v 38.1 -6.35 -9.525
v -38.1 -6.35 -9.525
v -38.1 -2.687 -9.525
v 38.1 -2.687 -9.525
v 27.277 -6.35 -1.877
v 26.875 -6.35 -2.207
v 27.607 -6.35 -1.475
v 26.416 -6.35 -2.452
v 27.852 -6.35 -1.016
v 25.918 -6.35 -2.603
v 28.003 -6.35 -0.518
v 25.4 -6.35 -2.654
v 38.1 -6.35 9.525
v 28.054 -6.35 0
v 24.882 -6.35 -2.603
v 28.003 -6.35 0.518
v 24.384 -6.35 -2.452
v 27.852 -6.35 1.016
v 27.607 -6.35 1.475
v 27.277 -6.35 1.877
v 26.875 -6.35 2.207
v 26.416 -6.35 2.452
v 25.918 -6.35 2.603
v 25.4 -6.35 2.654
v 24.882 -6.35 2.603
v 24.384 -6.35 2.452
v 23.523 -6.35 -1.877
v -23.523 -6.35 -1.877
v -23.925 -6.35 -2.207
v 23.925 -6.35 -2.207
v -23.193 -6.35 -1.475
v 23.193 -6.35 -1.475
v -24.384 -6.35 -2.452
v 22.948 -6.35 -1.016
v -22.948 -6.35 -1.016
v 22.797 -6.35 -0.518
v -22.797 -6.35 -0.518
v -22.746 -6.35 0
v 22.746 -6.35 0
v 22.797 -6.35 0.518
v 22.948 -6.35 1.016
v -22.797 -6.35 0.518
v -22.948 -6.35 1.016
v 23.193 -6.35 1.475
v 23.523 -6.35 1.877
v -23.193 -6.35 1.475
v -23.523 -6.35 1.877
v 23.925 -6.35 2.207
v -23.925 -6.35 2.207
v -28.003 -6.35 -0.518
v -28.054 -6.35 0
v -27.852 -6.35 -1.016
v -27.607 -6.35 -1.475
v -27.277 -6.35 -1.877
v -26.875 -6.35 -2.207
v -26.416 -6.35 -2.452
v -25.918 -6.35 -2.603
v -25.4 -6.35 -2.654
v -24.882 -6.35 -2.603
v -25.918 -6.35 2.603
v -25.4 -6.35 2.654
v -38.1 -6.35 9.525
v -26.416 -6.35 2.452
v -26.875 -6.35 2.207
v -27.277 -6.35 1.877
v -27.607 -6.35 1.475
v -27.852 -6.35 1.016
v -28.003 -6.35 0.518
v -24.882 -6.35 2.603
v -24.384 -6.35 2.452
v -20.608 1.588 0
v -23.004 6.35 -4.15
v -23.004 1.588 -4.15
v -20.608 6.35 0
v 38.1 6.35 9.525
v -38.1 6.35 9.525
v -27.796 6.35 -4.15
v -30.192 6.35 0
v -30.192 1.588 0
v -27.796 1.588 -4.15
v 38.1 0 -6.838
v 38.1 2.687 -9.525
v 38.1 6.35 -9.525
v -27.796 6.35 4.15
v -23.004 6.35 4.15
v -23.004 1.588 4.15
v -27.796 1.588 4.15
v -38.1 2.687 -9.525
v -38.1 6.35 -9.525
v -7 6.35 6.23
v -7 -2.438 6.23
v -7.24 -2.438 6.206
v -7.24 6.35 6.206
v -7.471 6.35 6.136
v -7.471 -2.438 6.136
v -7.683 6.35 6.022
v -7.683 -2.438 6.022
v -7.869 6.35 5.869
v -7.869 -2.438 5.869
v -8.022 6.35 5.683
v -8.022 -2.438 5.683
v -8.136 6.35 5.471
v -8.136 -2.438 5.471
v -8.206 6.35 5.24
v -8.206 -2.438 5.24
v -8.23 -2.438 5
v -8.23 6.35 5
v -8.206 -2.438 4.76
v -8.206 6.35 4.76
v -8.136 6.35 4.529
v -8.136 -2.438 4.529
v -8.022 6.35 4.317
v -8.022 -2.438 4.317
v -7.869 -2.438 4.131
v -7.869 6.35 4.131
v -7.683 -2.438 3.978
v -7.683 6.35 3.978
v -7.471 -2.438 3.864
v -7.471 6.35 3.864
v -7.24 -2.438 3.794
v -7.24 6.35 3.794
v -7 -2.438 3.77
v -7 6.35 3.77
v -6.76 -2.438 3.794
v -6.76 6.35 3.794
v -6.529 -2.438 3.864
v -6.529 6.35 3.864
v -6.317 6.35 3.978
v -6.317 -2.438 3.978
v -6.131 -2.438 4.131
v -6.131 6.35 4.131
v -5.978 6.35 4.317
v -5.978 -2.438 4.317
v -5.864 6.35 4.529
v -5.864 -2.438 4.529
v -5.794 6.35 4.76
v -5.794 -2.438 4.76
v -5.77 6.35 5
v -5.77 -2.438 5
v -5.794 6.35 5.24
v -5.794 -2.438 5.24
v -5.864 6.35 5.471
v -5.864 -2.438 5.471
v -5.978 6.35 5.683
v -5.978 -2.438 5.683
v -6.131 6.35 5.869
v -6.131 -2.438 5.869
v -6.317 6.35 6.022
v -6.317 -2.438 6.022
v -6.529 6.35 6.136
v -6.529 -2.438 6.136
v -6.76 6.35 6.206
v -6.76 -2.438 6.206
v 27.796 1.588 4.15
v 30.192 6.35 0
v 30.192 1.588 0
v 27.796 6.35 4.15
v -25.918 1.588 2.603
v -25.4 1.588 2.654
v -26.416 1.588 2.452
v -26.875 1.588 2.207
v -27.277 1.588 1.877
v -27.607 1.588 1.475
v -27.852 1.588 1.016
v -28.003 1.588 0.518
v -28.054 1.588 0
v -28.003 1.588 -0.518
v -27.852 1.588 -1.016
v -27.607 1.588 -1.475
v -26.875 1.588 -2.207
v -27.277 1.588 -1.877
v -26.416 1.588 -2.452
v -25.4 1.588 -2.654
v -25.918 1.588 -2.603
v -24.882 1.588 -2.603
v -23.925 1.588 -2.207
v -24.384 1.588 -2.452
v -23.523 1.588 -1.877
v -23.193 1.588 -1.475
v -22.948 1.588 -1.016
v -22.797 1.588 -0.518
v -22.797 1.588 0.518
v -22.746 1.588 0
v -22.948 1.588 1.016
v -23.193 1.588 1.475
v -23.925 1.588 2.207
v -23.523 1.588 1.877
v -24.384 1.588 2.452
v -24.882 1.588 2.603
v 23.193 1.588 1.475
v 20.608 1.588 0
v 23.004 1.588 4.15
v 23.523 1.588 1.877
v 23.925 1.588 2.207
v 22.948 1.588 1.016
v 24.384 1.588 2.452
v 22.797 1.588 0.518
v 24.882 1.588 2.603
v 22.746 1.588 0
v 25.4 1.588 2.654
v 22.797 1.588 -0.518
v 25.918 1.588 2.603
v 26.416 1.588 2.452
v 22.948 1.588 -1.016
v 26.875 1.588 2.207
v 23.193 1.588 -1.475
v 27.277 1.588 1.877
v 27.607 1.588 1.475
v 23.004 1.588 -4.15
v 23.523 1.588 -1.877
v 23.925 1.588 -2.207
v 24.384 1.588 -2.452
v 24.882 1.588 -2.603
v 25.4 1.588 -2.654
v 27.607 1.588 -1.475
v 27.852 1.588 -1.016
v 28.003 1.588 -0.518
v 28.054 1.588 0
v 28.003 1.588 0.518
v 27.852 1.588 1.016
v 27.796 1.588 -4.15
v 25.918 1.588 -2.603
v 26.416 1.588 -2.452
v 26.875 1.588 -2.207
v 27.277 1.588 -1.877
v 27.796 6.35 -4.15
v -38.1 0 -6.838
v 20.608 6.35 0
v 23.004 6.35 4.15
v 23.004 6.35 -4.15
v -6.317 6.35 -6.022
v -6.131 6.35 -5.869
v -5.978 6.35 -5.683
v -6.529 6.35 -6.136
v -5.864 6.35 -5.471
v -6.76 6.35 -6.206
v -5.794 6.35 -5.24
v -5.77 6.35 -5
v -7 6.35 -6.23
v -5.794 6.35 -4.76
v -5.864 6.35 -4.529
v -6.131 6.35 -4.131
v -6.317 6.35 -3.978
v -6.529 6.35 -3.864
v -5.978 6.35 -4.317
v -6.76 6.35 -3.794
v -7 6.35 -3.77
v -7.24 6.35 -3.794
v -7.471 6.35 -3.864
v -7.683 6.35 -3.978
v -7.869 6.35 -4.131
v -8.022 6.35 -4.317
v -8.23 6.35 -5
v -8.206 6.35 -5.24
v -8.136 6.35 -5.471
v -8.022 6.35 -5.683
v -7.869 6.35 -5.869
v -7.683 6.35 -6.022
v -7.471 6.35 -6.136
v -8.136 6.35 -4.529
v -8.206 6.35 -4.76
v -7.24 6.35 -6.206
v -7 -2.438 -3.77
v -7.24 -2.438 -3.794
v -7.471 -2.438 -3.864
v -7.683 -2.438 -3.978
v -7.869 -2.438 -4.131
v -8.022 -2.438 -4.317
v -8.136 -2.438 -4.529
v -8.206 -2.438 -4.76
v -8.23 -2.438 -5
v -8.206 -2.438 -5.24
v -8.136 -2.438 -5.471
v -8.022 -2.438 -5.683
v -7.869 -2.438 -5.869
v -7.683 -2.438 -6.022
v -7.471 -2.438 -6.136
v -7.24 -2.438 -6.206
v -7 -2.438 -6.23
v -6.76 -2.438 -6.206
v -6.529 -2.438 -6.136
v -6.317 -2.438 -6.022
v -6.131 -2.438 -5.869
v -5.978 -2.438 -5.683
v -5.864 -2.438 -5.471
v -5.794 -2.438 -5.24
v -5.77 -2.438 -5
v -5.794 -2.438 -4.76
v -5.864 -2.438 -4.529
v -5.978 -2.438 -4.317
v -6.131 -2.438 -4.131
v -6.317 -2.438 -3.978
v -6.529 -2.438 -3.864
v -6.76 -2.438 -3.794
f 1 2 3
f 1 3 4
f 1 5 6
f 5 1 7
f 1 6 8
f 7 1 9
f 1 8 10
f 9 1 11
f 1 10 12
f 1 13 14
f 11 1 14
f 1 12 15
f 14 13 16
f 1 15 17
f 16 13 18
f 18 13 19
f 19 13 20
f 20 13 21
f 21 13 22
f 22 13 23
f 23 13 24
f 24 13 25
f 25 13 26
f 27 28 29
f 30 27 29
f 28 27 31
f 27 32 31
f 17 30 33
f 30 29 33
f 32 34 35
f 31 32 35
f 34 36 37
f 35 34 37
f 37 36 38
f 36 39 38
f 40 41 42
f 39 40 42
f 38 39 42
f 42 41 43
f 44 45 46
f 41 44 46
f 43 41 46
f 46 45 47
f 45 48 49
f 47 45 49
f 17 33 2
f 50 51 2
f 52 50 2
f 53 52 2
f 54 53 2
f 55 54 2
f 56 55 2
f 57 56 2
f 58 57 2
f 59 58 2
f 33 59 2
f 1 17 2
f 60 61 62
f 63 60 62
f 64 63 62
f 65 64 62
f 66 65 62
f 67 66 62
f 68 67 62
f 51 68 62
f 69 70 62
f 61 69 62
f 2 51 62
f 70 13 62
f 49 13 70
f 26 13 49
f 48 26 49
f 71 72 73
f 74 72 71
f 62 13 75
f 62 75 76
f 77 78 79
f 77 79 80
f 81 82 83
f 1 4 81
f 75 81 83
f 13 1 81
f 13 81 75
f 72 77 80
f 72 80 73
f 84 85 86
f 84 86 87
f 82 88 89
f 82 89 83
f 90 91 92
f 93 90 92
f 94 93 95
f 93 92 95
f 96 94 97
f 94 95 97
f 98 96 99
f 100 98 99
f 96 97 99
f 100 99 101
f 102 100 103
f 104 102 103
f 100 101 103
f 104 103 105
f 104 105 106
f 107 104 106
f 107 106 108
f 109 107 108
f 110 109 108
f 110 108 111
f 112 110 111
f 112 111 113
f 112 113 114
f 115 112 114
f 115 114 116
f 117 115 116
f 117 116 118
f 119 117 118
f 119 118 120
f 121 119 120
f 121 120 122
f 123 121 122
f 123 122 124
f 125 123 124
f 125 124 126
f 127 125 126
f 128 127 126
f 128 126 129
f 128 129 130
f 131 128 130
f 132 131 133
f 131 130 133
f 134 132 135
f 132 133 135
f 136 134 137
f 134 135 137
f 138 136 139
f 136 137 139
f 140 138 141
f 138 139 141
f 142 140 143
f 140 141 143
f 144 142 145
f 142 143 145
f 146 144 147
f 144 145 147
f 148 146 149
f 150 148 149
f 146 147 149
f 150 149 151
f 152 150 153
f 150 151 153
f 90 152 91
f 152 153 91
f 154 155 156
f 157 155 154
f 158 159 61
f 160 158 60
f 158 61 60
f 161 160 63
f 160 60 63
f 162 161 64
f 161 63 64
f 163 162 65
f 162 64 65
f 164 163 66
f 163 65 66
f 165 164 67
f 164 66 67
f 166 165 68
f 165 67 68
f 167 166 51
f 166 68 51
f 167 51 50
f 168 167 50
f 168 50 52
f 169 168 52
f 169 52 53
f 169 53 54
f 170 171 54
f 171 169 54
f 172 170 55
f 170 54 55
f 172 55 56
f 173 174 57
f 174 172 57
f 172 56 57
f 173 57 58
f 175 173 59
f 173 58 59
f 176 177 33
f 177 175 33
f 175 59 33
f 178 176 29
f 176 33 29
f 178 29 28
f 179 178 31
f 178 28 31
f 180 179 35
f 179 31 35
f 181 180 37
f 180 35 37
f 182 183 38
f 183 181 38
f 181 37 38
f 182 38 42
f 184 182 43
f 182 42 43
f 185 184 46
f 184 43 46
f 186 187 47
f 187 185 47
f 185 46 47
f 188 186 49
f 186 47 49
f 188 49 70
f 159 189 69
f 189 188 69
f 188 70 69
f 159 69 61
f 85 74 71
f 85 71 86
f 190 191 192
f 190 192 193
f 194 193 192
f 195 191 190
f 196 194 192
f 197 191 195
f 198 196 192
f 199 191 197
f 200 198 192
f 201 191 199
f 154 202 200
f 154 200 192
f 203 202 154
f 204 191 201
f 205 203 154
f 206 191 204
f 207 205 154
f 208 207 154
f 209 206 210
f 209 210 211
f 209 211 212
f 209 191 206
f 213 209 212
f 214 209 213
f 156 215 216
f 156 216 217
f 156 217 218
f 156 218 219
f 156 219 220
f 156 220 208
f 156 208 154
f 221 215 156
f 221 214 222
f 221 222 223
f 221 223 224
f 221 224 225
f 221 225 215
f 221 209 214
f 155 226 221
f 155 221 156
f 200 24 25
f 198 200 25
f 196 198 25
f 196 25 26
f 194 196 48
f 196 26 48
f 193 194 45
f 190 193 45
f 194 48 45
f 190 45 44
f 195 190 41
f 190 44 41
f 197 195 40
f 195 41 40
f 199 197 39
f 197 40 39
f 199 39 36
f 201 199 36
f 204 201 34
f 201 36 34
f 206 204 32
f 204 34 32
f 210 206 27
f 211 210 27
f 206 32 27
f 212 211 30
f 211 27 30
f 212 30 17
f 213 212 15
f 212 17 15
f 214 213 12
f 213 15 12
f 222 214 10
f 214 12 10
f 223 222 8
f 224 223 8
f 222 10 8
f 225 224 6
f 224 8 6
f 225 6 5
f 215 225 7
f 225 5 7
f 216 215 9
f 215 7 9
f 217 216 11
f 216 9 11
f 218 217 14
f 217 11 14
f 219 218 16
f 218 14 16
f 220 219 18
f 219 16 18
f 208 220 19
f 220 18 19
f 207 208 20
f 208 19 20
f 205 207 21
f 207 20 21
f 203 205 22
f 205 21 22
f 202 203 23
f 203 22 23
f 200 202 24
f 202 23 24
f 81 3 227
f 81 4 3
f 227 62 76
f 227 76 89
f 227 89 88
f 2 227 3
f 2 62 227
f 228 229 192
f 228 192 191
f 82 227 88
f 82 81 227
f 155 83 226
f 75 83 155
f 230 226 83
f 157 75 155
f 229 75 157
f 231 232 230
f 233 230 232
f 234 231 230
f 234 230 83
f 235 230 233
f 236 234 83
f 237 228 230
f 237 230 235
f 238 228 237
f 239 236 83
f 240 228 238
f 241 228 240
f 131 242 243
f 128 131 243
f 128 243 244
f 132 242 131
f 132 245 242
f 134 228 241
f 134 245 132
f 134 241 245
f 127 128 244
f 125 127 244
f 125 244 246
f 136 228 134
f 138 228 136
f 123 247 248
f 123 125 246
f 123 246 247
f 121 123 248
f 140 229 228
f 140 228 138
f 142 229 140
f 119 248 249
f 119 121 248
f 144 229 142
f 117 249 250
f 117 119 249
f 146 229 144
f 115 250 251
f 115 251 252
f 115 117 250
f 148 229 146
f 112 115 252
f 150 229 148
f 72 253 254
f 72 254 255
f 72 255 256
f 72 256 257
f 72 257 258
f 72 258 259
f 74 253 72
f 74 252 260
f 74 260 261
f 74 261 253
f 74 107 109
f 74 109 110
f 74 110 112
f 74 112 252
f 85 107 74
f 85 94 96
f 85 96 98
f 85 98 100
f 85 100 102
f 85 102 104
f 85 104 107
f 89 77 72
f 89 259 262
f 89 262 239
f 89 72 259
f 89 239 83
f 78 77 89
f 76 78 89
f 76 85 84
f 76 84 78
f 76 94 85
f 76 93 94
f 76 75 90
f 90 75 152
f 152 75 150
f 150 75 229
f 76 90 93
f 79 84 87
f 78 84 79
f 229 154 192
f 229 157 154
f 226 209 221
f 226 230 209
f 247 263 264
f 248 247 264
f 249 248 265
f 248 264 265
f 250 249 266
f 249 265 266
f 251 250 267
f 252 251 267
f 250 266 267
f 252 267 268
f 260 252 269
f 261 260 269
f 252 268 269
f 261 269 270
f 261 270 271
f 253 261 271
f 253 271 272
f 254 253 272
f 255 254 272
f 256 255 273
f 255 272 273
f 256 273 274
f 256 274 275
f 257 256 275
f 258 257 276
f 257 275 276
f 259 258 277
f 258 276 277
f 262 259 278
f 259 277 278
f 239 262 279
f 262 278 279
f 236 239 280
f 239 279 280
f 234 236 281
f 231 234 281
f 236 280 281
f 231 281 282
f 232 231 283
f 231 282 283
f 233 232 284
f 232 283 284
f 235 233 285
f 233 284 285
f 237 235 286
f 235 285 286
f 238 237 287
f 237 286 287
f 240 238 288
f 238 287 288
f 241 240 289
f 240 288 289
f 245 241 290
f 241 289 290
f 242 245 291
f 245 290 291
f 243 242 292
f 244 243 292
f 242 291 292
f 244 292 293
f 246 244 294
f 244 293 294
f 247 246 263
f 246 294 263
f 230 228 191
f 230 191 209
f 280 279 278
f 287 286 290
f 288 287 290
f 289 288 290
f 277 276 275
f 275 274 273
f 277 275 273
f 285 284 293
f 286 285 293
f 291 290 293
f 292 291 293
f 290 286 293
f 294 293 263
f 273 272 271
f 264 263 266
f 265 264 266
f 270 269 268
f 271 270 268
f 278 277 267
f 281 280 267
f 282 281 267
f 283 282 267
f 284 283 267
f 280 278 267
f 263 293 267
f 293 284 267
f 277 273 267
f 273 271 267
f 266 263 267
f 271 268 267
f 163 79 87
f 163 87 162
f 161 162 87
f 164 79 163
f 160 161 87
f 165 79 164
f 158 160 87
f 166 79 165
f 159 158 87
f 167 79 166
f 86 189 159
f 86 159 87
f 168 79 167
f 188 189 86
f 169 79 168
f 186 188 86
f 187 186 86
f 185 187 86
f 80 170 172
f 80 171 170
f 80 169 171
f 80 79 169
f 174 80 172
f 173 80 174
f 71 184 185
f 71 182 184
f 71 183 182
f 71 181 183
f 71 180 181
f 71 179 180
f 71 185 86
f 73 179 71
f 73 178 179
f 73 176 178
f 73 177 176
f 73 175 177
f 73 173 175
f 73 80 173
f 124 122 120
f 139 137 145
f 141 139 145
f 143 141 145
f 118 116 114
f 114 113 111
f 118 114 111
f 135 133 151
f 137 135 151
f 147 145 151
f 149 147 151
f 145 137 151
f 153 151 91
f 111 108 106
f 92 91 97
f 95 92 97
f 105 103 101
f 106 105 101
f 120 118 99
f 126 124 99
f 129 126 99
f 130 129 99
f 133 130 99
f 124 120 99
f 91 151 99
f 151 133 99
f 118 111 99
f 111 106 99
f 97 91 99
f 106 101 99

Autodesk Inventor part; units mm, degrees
ref_plane "YZ Plane" through (0, 0, 0) normal (1, 0, 0) x (0, 1, 0)
ref_plane "XZ Plane" through (0, 0, 0) normal (0, 1, 0) x (-1, 0, 0)
ref_plane "XY Plane" through (0, 0, 0) normal (0, 0, 1) x (1, 0, 0)
sketch "Sketch1" plane through (0, 0, 0) normal (0, 1, 0) x (-1, 0, 0)
  line L0 (-38.1, 9.525) -> (38.1, 9.525)
  line L1 (38.1, 9.525) -> (38.1, -9.525)
  line L2 (38.1, -9.525) -> (-38.1, -9.525)
  line L3 (-38.1, -9.525) -> (-38.1, 9.525)
  line L4 (-38.1, 9.525) -> (38.1, -9.525) construction
  line L5 (38.1, 9.525) -> (-38.1, -9.525) construction
  point P0 (0, 0)
  dimension "d0" = 76.2
  dimension "d1" = 19.05
extrude "Extrusion1" add sketch "Sketch1" along normal mid plane 12.7
sketch "Sketch2" plane through (38.1, -6.35, -9.525) normal (1, 0, 0) x (0, 0, -1)
  line L0 (0, 3.663) -> (-2.687, 6.35)
  line L1 (-2.687, 6.35) -> (0, 9.037)
  line L2 (0, 9.037) -> (2.687, 6.35)
  line L3 (2.687, 6.35) -> (0, 3.663)
  line L4 (-19.05, 12.7) -> (0, 12.7) projected
  line L5 (0, 12.7) -> (0, 0) projected
  point P0 (-9.525, 6.35)
  point P1 (0, 6.35)
  dimension "d4" = 45
  dimension "d5" = 3.8
extrude "Extrusion2" cut sketch "Sketch2" against normal through all
sketch "Sketch5" plane through (0, 6.35, 0) normal (0, 1, 0) x (1, 0, 0)
  line L0 (-38.1, 9.525) -> (-38.1, -9.525) projected
  line L1 (38.1, -9.525) -> (38.1, 9.525) projected
  point P0 (0, 0)
  point P1 (-25.4, 0)
  point P2 (25.4, 0)
  dimension "d18" = 12.7
  dimension "d19" = 12.7
hole "Hole1" at (-25.4, 6.35, 0) at (25.4, 6.35, 0) direction (0, -1, 0) diameter 5.3086 end through all clearance for "Flat Head Machine Screw" size "M5" standard "Ansi Metric M Profile"
sketch "Sketch7" plane through (0, 6.35, 0) normal (0, 1, 0) x (1, 0, 0)
  circle A0 centre (-25.4, 0) radius 2.6543 projected
  circle A1 centre (25.4, 0) radius 2.6543 projected
  line L0 (-23.004, 4.15) -> (-20.608, 0)
  line L1 (-20.608, 0) -> (-23.004, -4.15)
  line L2 (-23.004, -4.15) -> (-27.796, -4.15)
  line L3 (-27.796, -4.15) -> (-30.192, 0)
  line L4 (-30.192, 0) -> (-27.796, 4.15)
  line L5 (-27.796, 4.15) -> (-23.004, 4.15)
  line L6 (23.004, -4.15) -> (20.608, 0)
  line L7 (20.608, 0) -> (23.004, 4.15)
  line L8 (23.004, 4.15) -> (27.796, 4.15)
  line L9 (27.796, 4.15) -> (30.192, 0)
  line L10 (30.192, 0) -> (27.796, -4.15)
  line L11 (27.796, -4.15) -> (23.004, -4.15)
  point P0 (0, 0)
  dimension "d39" = 8.3
  dimension "d40" = 8.3
extrude "Extrusion5" cut sketch "Sketch7" against normal blind 4.7625 contours A1 | L0 L1 L2 L3 L4 L5 | L6 L7 L8 L9 L10 L11
sketch "Sketch8" plane through (0, 6.35, 0) normal (0, 1, 0) x (1, 0, 0)
  point P0 (0, 0)
  point P1 (-7, -5)
  point P2 (-7, 5)
  dimension "d43" = 10
  dimension "d52" = 7
  dimension "d53" = 5
hole "Hole3" at (-7, 6.35, 5) at (-7, 6.35, -5) direction (0, -1, 0) diameter 2.459 depth 8.7884 thread size "M3x0.5" class "6H" standard "ANSI Metric M Profile"
equation "\"d40\" = d39"
properties part number "X-Axis_Mount_Slide_Endstop_MountLM3046" material "Acetal Resin, White"
